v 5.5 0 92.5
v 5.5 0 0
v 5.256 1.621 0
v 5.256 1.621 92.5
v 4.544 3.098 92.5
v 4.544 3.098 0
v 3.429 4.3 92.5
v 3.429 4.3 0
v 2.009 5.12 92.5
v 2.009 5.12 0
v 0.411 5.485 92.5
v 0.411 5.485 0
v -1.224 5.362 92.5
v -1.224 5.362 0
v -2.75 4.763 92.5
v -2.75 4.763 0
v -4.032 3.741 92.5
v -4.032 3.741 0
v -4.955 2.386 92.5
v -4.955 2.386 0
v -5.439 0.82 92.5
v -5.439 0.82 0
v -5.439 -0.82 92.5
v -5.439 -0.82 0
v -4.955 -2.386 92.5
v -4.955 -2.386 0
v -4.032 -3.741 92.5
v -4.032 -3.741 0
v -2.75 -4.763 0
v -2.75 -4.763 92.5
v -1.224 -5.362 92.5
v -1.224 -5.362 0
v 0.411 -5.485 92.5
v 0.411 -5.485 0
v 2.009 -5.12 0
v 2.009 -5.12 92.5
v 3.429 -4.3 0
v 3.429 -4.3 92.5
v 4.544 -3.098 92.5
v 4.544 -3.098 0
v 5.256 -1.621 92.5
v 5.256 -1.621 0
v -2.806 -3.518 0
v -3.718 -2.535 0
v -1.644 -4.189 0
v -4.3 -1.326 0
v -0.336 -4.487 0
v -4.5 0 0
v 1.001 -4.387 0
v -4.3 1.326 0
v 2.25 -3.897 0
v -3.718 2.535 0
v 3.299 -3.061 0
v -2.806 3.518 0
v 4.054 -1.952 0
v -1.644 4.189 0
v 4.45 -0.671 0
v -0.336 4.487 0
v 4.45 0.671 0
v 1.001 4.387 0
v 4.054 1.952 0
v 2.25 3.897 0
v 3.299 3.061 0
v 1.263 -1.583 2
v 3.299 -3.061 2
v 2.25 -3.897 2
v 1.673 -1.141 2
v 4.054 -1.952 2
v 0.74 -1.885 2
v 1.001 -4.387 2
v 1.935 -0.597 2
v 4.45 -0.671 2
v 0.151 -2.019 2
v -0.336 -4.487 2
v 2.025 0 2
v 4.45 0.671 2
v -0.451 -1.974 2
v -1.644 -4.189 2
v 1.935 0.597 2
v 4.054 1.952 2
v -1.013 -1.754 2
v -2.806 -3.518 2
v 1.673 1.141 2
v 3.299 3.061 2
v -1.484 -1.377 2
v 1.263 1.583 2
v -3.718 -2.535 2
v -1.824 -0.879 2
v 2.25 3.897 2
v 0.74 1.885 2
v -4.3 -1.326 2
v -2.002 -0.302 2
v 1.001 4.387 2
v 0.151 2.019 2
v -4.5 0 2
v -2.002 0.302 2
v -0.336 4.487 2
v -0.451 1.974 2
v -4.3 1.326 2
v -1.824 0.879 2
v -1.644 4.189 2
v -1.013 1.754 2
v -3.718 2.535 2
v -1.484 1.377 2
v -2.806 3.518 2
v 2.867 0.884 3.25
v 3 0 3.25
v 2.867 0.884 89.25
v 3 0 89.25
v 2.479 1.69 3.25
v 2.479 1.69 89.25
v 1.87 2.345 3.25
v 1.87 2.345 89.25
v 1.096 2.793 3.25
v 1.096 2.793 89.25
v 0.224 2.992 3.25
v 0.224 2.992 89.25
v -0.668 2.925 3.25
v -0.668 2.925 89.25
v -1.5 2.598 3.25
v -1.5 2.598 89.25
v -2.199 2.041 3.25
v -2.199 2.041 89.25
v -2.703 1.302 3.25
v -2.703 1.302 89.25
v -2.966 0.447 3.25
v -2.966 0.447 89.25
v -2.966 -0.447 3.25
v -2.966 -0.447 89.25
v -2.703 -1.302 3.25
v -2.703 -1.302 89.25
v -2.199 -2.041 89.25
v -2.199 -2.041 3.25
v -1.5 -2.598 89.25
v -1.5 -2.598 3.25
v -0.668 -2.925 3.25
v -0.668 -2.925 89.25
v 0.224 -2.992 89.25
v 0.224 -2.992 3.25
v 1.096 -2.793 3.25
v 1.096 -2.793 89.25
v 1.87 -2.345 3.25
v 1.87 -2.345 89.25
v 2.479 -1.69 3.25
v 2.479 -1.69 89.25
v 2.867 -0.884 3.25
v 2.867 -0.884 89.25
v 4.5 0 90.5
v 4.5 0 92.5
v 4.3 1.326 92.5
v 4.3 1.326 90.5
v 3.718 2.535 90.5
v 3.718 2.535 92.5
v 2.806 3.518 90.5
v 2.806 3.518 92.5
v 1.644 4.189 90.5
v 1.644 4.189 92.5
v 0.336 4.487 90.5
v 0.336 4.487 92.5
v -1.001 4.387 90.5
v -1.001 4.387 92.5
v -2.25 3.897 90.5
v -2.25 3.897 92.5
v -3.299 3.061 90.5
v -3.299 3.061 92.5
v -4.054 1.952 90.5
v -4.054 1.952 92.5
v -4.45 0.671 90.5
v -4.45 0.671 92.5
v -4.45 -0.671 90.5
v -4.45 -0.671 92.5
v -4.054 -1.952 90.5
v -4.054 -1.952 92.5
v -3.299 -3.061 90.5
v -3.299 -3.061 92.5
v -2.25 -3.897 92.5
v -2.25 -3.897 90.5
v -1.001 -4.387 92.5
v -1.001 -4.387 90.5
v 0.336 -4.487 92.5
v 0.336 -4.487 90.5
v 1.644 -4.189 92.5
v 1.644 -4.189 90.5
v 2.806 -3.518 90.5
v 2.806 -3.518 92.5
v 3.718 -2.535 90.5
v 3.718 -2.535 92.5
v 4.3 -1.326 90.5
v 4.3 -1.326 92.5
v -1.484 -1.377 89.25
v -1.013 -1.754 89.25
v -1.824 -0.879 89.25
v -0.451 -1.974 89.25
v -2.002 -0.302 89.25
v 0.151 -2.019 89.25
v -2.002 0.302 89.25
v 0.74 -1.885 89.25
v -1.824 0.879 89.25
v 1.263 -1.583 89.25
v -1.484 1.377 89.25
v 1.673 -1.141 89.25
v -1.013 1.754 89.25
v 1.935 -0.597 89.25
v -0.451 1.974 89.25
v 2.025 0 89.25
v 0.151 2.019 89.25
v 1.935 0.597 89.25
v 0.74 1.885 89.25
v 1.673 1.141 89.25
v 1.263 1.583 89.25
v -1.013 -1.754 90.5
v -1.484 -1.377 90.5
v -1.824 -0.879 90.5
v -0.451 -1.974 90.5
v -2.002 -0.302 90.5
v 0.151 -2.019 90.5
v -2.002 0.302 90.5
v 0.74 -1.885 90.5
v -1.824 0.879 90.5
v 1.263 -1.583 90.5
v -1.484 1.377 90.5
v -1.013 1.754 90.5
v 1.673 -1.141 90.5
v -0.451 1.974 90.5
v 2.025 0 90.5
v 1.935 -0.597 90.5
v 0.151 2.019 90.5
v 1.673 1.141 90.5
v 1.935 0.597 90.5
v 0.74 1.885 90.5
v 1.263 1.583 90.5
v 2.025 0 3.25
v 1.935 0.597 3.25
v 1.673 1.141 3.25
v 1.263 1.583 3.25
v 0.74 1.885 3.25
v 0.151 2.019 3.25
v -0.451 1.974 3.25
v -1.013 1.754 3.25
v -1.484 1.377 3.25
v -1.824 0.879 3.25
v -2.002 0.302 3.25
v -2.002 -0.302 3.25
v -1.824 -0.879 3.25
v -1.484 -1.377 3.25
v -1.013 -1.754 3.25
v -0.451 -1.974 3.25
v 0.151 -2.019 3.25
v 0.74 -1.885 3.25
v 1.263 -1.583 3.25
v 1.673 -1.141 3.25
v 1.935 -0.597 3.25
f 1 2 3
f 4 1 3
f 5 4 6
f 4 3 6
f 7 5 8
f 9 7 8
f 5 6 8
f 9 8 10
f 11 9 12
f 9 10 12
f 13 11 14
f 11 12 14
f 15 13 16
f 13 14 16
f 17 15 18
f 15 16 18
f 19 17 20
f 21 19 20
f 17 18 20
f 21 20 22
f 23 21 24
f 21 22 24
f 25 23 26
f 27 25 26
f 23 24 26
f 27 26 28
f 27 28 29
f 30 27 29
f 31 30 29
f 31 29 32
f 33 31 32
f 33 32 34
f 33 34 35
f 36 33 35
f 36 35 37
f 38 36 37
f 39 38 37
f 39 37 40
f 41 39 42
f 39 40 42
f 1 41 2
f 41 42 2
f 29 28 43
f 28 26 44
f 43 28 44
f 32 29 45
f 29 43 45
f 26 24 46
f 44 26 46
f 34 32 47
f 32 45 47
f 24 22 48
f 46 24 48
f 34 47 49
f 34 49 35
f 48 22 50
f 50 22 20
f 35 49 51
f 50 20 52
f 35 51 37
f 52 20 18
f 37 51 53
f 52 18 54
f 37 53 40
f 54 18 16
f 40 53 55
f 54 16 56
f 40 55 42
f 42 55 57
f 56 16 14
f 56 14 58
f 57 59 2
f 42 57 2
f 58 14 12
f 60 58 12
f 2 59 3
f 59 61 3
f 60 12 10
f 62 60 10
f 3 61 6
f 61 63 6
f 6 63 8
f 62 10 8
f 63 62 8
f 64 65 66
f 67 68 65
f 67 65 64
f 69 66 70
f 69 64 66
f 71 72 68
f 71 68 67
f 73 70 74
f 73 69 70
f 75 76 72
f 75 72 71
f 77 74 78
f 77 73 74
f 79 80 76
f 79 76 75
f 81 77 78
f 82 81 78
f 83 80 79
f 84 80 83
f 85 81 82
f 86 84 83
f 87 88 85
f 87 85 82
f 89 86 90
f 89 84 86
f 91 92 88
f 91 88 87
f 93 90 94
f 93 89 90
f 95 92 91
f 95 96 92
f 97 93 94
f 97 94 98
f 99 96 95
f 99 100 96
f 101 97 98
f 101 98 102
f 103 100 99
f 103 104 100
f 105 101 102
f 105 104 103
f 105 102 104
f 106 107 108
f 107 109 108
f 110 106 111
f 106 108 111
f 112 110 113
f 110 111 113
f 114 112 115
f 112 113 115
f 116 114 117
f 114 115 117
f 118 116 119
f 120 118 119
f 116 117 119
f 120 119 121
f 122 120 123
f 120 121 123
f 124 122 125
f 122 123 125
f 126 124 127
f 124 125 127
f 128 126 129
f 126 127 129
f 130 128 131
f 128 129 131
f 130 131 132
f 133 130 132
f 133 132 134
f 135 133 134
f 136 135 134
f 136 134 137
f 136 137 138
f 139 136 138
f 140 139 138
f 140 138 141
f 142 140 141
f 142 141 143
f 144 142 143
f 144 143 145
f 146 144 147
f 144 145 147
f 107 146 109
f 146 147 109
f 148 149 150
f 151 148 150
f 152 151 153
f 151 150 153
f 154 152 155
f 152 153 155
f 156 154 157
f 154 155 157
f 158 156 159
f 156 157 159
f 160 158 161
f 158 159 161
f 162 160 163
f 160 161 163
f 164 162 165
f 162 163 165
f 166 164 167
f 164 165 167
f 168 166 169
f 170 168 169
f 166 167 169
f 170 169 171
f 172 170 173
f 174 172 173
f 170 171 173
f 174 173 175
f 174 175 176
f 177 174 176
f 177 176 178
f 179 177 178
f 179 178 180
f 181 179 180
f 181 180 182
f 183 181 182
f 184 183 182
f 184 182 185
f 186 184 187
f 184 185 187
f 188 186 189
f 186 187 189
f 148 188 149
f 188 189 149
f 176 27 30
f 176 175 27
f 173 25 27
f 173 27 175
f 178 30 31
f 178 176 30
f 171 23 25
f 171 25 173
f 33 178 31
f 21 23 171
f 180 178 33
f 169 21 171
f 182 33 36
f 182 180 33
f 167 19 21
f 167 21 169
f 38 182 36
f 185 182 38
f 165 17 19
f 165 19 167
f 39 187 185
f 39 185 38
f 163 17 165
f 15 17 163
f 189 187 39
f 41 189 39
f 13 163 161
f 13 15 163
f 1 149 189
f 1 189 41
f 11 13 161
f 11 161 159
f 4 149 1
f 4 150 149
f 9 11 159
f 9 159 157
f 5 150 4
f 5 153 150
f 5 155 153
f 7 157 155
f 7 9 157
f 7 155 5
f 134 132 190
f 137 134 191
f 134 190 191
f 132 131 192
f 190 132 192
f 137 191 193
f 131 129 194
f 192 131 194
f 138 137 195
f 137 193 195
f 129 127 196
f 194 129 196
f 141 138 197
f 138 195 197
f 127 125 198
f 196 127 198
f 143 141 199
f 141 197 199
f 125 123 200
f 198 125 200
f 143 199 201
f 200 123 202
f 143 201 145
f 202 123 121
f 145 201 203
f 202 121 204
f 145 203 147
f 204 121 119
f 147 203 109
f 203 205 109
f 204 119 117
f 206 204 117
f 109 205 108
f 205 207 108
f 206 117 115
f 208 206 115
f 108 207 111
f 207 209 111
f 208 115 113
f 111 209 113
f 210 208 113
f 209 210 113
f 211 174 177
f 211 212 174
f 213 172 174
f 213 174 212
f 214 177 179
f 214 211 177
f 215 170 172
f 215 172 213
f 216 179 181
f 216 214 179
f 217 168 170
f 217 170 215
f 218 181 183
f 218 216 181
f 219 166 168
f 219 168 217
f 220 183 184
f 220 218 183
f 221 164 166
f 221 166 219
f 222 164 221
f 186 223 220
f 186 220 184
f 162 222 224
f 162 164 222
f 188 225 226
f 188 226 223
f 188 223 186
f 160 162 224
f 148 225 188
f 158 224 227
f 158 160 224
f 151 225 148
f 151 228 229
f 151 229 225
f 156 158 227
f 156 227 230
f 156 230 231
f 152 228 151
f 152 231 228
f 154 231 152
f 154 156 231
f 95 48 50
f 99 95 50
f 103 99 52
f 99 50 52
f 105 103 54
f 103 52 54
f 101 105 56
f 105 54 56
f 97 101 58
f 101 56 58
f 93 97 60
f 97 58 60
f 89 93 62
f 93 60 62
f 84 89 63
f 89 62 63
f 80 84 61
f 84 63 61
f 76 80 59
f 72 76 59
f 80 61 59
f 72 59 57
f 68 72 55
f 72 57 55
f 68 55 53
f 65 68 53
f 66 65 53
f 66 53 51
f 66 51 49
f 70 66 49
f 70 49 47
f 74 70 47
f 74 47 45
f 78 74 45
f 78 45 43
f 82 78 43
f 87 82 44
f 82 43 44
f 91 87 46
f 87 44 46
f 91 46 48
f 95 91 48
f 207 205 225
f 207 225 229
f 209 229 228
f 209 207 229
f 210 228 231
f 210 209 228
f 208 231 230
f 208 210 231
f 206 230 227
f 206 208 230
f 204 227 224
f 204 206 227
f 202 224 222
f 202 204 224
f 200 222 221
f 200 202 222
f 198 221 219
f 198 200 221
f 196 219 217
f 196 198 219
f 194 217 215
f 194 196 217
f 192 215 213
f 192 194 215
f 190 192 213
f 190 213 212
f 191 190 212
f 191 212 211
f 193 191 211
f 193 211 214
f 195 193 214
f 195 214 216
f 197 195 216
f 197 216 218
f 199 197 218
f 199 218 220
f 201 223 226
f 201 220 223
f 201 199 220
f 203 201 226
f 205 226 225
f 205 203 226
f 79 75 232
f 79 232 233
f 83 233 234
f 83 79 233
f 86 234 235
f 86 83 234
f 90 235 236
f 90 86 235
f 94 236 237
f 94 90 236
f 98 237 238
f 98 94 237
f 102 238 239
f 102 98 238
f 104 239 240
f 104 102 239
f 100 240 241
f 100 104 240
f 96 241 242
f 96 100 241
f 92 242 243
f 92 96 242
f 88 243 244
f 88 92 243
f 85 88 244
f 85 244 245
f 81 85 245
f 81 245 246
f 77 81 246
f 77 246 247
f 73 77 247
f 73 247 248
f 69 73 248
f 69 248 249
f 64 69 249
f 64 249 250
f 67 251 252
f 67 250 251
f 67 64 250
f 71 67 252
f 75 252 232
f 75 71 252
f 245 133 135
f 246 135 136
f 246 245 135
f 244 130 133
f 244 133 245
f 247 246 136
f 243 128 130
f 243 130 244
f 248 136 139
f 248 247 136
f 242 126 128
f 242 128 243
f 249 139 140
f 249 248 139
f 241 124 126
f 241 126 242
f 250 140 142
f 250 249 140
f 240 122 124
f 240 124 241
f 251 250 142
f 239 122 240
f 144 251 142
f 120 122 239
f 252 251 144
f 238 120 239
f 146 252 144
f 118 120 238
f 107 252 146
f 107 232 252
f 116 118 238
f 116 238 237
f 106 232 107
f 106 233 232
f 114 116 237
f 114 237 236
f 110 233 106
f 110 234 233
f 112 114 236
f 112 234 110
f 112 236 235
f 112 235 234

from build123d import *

# Parameters (mm, degrees)
SKETCH1_R           = 5.5
SKETCH1_R_2         = 2.025
BOSS_EXTRUDE1_DEPTH = 92.5
SKETCH2_R           = 4.5
CUT_EXTRUDE1_DEPTH  = 2
SKETCH3_R           = 4.5
CUT_EXTRUDE2_DEPTH  = 2
SKETCH4_R           = 3
CUT_EXTRUDE3_DEPTH  = 43


with BuildPart() as part:
    # Sketch1 → Boss-Extrude1 (new body)
    with BuildSketch(Plane.XY):
        Circle(SKETCH1_R)
        Circle(SKETCH1_R_2, mode=Mode.SUBTRACT)
    extrude(amount=BOSS_EXTRUDE1_DEPTH)

    # Sketch2 → Cut-Extrude1 (cut)
    with BuildSketch(Plane.XY.offset(92.5)):
        Circle(SKETCH2_R)
    extrude(amount=-CUT_EXTRUDE1_DEPTH, mode=Mode.SUBTRACT)

    # Sketch3 → Cut-Extrude2 (cut)
    with BuildSketch(Plane(origin=(0, 0, 0), x_dir=(-1, 0, 0), z_dir=(0, 0, -1))):
        Circle(SKETCH3_R)
    extrude(amount=-CUT_EXTRUDE2_DEPTH, mode=Mode.SUBTRACT)

    # Sketch4 → Cut-Extrude3 (cut, symmetric)
    with BuildSketch(Plane.XY.offset(46.25)):
        Circle(SKETCH4_R)
    extrude(amount=CUT_EXTRUDE3_DEPTH, both=True, mode=Mode.SUBTRACT)


solid = part.part
